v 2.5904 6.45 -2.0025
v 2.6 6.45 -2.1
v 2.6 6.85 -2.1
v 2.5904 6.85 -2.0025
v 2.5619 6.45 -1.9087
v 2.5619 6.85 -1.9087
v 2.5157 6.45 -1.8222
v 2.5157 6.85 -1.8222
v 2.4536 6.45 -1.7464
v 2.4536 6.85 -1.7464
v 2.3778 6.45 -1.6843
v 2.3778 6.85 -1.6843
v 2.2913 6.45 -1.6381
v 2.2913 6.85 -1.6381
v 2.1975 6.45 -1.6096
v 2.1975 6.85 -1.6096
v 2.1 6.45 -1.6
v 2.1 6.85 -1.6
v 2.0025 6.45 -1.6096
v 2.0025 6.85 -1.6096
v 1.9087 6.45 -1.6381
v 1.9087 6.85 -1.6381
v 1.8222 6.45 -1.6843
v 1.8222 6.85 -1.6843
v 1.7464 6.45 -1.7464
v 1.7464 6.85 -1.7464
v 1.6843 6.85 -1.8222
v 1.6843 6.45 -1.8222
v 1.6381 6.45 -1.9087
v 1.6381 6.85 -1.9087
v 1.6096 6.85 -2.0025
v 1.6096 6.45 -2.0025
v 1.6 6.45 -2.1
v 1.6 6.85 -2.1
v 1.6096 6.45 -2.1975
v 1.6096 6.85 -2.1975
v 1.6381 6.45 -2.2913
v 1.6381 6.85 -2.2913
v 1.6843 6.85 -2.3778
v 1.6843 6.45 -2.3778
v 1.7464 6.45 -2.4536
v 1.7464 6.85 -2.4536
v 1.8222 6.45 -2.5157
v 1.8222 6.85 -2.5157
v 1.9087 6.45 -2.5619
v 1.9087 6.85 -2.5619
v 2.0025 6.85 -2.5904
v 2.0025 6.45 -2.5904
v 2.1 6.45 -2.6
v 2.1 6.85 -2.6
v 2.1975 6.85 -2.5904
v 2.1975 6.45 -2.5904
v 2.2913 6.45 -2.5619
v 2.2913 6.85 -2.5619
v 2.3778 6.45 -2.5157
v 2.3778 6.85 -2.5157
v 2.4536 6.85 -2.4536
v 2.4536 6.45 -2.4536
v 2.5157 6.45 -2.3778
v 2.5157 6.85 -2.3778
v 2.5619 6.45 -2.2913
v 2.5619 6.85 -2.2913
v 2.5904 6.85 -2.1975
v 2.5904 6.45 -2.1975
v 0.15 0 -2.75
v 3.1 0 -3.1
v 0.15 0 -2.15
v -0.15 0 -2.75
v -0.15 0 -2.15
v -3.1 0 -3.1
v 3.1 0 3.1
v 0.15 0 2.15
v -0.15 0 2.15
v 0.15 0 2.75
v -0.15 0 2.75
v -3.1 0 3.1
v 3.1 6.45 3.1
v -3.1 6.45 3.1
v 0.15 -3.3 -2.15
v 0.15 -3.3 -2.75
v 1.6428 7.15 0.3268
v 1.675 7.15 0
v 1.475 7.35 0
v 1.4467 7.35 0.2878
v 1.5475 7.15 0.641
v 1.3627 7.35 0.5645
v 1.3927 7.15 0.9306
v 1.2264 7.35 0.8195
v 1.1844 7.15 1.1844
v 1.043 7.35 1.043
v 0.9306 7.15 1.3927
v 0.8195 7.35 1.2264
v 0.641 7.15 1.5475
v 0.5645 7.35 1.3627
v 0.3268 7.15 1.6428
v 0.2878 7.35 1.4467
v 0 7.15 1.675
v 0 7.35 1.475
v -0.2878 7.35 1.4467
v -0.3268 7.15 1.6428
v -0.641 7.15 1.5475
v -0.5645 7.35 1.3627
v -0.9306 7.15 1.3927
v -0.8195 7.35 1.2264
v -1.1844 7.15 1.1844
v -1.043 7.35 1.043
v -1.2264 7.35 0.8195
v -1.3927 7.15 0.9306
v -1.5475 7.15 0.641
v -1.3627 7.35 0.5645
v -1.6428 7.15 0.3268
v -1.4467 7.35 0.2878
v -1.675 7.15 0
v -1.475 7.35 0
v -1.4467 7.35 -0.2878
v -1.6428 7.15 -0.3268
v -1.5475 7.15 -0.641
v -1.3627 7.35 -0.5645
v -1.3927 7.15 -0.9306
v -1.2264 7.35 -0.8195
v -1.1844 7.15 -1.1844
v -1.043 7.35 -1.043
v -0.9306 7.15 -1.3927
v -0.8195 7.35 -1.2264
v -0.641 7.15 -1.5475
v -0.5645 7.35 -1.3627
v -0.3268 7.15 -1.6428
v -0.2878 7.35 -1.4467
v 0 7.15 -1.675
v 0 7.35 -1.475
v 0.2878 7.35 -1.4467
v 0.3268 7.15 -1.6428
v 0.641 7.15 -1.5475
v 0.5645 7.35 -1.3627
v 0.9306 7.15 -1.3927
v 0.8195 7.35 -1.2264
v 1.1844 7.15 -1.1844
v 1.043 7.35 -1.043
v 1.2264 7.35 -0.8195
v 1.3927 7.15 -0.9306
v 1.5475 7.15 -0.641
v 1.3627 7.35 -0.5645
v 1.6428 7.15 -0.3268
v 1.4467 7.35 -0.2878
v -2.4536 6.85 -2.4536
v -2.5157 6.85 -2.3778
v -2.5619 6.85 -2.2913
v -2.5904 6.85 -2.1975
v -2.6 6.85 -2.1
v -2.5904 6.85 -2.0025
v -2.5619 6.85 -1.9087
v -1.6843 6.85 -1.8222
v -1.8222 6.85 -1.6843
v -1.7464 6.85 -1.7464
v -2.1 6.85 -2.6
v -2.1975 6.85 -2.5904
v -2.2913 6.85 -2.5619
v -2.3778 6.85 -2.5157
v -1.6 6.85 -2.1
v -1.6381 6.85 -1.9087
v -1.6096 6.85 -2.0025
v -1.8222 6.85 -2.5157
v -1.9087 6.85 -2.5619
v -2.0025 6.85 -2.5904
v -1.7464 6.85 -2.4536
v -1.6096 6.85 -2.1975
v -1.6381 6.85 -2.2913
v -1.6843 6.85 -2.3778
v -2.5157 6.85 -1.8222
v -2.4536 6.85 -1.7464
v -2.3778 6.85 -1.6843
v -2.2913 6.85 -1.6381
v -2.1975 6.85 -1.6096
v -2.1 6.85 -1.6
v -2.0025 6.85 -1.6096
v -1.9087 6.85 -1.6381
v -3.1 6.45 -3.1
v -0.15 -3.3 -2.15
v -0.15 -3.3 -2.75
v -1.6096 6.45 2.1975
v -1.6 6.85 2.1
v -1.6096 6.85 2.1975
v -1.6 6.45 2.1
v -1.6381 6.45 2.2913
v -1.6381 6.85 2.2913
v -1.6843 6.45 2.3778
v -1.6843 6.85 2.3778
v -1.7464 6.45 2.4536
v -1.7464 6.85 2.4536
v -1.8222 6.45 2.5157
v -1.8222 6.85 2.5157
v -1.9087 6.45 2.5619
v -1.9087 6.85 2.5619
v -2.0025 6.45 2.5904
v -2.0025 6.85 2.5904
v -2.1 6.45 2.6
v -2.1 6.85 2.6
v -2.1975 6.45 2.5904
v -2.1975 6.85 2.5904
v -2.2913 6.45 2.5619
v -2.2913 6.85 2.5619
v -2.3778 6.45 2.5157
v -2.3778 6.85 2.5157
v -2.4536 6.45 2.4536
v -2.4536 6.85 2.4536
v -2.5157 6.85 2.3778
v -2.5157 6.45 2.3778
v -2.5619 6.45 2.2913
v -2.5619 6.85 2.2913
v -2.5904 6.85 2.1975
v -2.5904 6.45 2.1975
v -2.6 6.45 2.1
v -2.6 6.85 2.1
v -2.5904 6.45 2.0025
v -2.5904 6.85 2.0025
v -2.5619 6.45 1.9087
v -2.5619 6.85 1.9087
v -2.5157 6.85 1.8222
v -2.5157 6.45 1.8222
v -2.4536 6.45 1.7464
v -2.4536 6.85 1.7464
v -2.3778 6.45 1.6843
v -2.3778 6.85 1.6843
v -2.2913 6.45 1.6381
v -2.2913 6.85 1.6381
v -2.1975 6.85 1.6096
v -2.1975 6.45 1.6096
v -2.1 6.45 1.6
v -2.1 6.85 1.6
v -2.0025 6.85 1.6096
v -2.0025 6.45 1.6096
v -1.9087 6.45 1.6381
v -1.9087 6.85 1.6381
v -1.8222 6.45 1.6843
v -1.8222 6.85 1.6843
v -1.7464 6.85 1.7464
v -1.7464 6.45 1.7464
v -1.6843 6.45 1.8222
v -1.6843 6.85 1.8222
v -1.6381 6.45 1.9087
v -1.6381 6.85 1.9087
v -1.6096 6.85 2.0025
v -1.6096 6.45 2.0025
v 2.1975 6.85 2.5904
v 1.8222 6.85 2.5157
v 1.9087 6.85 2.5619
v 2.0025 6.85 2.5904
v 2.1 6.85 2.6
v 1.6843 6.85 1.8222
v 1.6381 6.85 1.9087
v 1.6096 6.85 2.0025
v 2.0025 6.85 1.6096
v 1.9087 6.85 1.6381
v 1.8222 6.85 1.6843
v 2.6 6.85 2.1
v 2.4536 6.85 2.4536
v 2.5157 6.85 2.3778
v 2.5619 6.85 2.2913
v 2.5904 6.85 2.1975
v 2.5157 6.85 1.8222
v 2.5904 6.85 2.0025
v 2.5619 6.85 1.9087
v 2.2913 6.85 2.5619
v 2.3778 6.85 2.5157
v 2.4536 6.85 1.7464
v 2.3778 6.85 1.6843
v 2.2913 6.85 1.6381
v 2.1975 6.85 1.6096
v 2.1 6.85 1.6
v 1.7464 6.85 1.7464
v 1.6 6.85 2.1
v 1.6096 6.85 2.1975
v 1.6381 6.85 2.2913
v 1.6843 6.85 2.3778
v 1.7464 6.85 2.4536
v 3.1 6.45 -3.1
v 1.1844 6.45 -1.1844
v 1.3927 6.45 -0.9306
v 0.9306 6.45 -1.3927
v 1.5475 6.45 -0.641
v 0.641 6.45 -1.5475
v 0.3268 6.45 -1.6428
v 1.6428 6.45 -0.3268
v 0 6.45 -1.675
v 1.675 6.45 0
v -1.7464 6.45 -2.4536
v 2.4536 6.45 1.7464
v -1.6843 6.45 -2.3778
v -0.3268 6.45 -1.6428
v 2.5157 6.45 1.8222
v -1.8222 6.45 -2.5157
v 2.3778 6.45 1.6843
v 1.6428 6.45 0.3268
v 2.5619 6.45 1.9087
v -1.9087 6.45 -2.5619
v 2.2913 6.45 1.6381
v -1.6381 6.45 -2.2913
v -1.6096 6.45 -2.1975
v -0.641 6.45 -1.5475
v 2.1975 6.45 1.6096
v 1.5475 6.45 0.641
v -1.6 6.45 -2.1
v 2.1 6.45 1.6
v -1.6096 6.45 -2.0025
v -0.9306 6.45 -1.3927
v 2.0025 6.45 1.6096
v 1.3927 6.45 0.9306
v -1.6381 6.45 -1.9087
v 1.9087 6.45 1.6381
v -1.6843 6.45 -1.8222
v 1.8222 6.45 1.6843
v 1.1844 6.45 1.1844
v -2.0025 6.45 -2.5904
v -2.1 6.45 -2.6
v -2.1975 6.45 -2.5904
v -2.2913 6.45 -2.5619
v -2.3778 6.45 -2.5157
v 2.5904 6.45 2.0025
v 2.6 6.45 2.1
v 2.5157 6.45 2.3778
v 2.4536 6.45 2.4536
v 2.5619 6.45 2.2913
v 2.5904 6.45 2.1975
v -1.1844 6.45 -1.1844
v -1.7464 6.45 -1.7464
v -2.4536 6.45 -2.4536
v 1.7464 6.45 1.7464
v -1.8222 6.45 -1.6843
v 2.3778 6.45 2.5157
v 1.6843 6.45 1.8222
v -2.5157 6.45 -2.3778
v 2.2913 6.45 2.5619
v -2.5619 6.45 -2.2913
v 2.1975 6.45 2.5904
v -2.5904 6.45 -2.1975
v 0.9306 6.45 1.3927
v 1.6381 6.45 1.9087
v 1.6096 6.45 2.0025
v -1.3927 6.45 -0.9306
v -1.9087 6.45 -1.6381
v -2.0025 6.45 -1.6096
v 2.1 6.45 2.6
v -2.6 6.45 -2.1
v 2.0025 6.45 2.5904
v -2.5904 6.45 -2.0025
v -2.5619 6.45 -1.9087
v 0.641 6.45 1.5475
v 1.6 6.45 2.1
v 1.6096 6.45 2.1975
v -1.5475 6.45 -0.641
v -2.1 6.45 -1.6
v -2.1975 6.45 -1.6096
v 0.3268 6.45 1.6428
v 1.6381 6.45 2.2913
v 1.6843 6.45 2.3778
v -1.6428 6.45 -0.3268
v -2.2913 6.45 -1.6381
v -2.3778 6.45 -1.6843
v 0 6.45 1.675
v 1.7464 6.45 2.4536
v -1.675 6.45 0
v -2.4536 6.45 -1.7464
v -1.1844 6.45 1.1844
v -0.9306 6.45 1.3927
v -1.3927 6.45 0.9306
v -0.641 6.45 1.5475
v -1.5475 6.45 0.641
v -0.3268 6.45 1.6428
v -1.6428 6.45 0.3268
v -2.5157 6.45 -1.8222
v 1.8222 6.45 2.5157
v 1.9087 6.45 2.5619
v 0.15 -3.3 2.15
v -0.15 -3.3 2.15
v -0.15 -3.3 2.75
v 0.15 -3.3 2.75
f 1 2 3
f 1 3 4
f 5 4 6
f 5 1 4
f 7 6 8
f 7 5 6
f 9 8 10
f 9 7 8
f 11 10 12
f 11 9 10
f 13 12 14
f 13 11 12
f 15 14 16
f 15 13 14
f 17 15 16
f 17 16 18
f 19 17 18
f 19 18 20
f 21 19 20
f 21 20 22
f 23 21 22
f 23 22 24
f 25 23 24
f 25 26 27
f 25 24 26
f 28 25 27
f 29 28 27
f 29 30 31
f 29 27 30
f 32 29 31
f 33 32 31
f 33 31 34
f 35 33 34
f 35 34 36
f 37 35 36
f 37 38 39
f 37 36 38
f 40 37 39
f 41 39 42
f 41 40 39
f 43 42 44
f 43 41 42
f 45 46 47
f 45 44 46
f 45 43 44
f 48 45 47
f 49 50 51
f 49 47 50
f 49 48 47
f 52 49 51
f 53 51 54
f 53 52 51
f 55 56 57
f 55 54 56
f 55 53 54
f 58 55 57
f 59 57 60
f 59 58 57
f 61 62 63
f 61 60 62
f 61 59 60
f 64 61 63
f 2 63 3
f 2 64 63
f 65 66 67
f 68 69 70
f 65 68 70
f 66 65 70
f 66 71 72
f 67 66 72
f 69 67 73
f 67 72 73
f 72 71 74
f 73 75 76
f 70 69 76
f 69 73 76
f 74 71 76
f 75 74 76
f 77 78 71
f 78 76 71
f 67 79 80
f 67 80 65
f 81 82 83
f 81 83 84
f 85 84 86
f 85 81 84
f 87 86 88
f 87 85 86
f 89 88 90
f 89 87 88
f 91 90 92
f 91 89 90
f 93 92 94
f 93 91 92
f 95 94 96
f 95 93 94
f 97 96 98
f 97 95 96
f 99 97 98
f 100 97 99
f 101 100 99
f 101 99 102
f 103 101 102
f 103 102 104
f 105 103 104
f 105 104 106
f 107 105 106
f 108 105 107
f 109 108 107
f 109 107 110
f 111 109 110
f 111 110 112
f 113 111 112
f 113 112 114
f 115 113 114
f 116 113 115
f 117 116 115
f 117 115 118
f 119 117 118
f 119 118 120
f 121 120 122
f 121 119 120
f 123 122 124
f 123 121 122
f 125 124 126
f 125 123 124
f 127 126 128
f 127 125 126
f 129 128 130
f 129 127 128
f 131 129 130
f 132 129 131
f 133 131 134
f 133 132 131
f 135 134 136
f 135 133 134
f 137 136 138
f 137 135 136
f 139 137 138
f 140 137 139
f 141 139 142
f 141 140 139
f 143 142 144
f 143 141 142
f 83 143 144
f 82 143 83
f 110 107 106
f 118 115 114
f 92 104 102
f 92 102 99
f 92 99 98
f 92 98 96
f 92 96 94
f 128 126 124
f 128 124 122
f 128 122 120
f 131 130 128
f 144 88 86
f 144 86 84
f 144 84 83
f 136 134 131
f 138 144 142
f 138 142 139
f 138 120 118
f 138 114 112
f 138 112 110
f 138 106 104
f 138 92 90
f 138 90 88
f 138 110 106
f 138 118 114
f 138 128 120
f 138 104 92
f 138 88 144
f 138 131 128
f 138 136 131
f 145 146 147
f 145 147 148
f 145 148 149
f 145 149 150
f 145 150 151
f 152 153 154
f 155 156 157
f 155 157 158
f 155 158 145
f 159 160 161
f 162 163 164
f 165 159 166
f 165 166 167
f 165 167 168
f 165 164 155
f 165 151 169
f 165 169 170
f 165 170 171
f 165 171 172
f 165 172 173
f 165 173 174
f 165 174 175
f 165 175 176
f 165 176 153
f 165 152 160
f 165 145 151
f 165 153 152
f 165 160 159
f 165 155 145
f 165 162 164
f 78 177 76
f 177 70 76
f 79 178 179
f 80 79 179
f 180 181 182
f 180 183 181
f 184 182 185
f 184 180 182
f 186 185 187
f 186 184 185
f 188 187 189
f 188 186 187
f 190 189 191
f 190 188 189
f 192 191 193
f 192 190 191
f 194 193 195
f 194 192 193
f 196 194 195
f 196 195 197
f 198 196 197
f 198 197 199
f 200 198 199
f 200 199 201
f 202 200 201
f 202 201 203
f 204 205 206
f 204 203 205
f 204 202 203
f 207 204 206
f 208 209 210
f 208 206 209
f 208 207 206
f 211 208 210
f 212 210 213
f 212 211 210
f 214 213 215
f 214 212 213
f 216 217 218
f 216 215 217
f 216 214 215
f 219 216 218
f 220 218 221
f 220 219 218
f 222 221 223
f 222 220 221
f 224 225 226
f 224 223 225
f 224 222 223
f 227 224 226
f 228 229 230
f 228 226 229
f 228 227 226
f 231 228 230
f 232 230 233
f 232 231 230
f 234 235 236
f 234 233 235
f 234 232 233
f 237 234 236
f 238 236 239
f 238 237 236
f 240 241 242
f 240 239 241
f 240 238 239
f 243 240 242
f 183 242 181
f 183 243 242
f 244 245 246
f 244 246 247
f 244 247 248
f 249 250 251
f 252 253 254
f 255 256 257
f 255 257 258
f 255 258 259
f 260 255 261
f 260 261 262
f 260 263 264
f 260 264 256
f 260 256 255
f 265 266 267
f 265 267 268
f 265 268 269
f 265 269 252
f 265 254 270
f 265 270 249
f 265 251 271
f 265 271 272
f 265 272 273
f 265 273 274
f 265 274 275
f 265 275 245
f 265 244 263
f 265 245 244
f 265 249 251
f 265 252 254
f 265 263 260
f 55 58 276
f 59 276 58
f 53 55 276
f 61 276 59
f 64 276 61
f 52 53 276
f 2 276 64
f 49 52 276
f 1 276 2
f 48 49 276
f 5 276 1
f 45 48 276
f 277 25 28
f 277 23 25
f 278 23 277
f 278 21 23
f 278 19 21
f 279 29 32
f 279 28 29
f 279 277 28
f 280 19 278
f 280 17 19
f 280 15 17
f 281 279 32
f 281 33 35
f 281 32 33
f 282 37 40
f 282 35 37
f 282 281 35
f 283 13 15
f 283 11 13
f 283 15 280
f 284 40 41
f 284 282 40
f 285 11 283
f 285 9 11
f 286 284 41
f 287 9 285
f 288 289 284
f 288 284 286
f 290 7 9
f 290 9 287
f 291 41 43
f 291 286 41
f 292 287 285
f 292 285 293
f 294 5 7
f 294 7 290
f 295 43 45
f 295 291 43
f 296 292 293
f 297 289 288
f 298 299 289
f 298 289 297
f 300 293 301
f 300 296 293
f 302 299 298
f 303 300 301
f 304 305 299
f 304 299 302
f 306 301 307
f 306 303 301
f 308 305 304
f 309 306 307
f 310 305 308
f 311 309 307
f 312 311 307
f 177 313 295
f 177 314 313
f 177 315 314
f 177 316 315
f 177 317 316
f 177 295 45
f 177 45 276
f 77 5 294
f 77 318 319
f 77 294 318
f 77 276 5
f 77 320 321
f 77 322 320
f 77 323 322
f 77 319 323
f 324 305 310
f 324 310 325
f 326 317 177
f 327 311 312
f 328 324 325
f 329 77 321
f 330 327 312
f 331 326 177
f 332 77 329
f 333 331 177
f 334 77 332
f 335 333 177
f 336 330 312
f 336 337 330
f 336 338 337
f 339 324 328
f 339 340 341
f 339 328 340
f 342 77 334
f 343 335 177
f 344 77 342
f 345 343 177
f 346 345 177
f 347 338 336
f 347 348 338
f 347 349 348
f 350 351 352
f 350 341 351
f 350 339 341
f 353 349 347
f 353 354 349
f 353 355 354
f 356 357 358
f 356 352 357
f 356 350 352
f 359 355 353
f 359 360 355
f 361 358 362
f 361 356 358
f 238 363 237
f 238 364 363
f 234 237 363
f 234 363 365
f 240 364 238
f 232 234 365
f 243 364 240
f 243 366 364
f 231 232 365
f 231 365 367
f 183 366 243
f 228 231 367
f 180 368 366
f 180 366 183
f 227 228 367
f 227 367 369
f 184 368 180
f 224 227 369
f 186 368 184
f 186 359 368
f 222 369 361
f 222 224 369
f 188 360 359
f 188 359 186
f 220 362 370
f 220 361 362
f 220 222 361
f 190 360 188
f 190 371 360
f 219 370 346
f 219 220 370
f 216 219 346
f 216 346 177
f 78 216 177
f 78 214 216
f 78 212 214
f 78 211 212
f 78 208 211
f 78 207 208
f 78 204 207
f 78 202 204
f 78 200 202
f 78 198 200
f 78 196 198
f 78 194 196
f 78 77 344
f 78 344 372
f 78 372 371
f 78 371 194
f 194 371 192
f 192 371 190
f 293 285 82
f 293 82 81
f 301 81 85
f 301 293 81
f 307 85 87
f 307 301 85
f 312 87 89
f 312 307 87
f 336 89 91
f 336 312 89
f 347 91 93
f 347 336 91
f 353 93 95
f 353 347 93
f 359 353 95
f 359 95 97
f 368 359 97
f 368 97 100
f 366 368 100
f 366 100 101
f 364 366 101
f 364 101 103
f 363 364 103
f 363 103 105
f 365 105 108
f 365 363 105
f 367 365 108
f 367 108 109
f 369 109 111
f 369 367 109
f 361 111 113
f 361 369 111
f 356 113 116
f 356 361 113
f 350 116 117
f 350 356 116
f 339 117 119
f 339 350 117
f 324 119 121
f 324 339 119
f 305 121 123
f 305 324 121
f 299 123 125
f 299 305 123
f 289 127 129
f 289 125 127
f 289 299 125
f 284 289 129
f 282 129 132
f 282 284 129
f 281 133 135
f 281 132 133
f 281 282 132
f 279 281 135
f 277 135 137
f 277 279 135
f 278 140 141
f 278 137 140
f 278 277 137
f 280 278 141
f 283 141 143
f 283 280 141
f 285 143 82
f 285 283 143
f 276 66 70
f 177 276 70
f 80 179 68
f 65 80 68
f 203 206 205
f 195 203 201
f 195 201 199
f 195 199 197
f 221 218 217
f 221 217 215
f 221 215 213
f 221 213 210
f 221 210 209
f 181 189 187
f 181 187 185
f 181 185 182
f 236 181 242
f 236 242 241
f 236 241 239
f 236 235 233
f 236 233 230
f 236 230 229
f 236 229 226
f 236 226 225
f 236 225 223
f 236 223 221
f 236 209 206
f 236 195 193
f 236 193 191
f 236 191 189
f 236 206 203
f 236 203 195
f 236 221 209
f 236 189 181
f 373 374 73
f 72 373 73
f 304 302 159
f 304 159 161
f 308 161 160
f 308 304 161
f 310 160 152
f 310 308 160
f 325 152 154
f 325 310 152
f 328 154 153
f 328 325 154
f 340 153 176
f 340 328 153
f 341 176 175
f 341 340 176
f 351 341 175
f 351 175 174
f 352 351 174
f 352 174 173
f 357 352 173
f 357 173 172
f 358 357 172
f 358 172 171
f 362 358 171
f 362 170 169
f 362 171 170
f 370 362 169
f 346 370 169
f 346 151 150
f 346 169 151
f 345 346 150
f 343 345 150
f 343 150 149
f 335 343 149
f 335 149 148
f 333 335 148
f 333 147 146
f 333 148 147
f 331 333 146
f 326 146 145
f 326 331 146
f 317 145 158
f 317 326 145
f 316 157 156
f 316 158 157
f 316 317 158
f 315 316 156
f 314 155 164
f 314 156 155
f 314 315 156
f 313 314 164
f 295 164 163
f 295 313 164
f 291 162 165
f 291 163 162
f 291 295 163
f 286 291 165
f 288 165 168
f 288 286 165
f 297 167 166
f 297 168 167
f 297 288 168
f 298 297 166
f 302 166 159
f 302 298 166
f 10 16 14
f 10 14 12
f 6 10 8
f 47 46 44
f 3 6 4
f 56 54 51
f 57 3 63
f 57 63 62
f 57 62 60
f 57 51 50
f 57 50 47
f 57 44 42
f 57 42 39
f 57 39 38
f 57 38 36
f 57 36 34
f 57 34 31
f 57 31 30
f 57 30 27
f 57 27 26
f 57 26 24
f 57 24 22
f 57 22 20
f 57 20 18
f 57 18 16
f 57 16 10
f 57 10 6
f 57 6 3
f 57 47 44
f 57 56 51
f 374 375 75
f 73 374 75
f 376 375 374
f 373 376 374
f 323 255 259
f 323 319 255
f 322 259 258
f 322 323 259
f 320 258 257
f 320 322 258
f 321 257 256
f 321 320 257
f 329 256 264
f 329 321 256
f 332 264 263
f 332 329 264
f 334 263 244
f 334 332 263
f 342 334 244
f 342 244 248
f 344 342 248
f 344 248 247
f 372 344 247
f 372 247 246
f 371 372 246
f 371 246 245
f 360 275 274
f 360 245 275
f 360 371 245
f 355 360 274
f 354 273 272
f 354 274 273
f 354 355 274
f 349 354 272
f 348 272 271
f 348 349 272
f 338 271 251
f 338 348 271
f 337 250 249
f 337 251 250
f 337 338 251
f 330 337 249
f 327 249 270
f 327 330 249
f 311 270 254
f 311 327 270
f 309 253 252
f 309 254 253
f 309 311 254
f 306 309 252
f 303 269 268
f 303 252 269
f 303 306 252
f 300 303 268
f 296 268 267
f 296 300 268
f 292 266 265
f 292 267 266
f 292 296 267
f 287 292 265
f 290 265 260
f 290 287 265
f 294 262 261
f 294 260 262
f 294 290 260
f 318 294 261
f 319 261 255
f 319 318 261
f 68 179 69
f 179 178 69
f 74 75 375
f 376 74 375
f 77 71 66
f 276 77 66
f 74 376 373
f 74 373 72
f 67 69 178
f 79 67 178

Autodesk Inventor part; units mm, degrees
ref_plane "YZ Plane" through (0, 0, 0) normal (1, 0, 0) x (0, 1, 0)
ref_plane "XZ Plane" through (0, 0, 0) normal (0, 1, 0) x (-1, 0, 0)
ref_plane "XY Plane" through (0, 0, 0) normal (0, 0, 1) x (1, 0, 0)
sketch "Sketch1" plane through (0, 0, 0) normal (0, 1, 0) x (-1, 0, 0)
  line L0 (3.1, 3.1) -> (-3.1, 3.1)
  line L1 (-3.1, 3.1) -> (-3.1, -3.1)
  line L2 (-3.1, -3.1) -> (3.1, -3.1)
  line L3 (3.1, -3.1) -> (3.1, 3.1)
  line L4 (4.34, 0) -> (-4.34, 0) construction
  line L5 (0, -4.34) -> (0, 4.34) construction
  point P0 (0, 0)
  dimension "d0" = 6.2
  dimension "d1" = 6.2
extrude "Extrusion1" add sketch "Sketch1" along normal blind 6.45
sketch "Sketch2" plane through (0, 6.45, 0) normal (0, 1, 0) x (1, 0, 0)
  circle A0 centre (-2.1, -2.1) radius 0.5
  circle A1 centre (-2.1, 2.1) radius 0.5
  circle A2 centre (2.1, 2.1) radius 0.5
  circle A3 centre (2.1, -2.1) radius 0.5
  line L0 (-3.1, -3.1) -> (3.1, -3.1) projected
  line L1 (-3.1, 3.1) -> (-3.1, -3.1) projected
  line L2 (3.1, 3.1) -> (-3.1, 3.1) projected
  line L3 (3.1, -3.1) -> (3.1, 3.1) projected
  point P0 (0, 0)
  dimension "d4" = 1
  dimension "d5" = 1
  dimension "d6" = 1
  dimension "d7" = 1
  dimension "d8" = 1
  dimension "d9" = 1
  dimension "d10" = 1
  dimension "d11" = 1
extrude "Extrusion2" add sketch "Sketch2" along normal blind 0.4 contours A0 | A1 | A2 | A3
sketch "Sketch3" plane through (0, 6.45, 0) normal (0, 1, 0) x (1, 0, 0)
  circle A0 centre (0, 0) radius 1.675
  dimension "d14" = 3.35
extrude "Extrusion3" add sketch "Sketch3" along normal blind 0.9
chamfer "Chamfer1" distance 0.2 angle 45 1 edges at (-1.675, 7.35, 0)
sketch "Sketch4" plane through (0, 0, 0) normal (1, 0, 0) x (0, 1, 0)
  line L0 (0, 3.1) -> (0, -3.1) projected
  line L1 (0, 2.75) -> (-3.3, 2.75)
  line L2 (-3.3, 2.75) -> (-3.3, 2.15)
  line L3 (-3.3, 2.15) -> (0, 2.15)
  line L4 (0, -2.15) -> (-3.3, -2.15)
  line L5 (-3.3, -2.15) -> (-3.3, -2.75)
  line L6 (-3.3, -2.75) -> (0, -2.75)
  line L7 (-3.96, 0) -> (0.66, 0) projected
  point P0 (0, 0)
  dimension "d20" = 5.5
  dimension "d21" = 0.6
  dimension "d22" = 0.6
  dimension "d23" = 3.3
extrude "Extrusion4" add sketch "Sketch4" along normal mid plane 0.3
properties part number "6mm_switch"
